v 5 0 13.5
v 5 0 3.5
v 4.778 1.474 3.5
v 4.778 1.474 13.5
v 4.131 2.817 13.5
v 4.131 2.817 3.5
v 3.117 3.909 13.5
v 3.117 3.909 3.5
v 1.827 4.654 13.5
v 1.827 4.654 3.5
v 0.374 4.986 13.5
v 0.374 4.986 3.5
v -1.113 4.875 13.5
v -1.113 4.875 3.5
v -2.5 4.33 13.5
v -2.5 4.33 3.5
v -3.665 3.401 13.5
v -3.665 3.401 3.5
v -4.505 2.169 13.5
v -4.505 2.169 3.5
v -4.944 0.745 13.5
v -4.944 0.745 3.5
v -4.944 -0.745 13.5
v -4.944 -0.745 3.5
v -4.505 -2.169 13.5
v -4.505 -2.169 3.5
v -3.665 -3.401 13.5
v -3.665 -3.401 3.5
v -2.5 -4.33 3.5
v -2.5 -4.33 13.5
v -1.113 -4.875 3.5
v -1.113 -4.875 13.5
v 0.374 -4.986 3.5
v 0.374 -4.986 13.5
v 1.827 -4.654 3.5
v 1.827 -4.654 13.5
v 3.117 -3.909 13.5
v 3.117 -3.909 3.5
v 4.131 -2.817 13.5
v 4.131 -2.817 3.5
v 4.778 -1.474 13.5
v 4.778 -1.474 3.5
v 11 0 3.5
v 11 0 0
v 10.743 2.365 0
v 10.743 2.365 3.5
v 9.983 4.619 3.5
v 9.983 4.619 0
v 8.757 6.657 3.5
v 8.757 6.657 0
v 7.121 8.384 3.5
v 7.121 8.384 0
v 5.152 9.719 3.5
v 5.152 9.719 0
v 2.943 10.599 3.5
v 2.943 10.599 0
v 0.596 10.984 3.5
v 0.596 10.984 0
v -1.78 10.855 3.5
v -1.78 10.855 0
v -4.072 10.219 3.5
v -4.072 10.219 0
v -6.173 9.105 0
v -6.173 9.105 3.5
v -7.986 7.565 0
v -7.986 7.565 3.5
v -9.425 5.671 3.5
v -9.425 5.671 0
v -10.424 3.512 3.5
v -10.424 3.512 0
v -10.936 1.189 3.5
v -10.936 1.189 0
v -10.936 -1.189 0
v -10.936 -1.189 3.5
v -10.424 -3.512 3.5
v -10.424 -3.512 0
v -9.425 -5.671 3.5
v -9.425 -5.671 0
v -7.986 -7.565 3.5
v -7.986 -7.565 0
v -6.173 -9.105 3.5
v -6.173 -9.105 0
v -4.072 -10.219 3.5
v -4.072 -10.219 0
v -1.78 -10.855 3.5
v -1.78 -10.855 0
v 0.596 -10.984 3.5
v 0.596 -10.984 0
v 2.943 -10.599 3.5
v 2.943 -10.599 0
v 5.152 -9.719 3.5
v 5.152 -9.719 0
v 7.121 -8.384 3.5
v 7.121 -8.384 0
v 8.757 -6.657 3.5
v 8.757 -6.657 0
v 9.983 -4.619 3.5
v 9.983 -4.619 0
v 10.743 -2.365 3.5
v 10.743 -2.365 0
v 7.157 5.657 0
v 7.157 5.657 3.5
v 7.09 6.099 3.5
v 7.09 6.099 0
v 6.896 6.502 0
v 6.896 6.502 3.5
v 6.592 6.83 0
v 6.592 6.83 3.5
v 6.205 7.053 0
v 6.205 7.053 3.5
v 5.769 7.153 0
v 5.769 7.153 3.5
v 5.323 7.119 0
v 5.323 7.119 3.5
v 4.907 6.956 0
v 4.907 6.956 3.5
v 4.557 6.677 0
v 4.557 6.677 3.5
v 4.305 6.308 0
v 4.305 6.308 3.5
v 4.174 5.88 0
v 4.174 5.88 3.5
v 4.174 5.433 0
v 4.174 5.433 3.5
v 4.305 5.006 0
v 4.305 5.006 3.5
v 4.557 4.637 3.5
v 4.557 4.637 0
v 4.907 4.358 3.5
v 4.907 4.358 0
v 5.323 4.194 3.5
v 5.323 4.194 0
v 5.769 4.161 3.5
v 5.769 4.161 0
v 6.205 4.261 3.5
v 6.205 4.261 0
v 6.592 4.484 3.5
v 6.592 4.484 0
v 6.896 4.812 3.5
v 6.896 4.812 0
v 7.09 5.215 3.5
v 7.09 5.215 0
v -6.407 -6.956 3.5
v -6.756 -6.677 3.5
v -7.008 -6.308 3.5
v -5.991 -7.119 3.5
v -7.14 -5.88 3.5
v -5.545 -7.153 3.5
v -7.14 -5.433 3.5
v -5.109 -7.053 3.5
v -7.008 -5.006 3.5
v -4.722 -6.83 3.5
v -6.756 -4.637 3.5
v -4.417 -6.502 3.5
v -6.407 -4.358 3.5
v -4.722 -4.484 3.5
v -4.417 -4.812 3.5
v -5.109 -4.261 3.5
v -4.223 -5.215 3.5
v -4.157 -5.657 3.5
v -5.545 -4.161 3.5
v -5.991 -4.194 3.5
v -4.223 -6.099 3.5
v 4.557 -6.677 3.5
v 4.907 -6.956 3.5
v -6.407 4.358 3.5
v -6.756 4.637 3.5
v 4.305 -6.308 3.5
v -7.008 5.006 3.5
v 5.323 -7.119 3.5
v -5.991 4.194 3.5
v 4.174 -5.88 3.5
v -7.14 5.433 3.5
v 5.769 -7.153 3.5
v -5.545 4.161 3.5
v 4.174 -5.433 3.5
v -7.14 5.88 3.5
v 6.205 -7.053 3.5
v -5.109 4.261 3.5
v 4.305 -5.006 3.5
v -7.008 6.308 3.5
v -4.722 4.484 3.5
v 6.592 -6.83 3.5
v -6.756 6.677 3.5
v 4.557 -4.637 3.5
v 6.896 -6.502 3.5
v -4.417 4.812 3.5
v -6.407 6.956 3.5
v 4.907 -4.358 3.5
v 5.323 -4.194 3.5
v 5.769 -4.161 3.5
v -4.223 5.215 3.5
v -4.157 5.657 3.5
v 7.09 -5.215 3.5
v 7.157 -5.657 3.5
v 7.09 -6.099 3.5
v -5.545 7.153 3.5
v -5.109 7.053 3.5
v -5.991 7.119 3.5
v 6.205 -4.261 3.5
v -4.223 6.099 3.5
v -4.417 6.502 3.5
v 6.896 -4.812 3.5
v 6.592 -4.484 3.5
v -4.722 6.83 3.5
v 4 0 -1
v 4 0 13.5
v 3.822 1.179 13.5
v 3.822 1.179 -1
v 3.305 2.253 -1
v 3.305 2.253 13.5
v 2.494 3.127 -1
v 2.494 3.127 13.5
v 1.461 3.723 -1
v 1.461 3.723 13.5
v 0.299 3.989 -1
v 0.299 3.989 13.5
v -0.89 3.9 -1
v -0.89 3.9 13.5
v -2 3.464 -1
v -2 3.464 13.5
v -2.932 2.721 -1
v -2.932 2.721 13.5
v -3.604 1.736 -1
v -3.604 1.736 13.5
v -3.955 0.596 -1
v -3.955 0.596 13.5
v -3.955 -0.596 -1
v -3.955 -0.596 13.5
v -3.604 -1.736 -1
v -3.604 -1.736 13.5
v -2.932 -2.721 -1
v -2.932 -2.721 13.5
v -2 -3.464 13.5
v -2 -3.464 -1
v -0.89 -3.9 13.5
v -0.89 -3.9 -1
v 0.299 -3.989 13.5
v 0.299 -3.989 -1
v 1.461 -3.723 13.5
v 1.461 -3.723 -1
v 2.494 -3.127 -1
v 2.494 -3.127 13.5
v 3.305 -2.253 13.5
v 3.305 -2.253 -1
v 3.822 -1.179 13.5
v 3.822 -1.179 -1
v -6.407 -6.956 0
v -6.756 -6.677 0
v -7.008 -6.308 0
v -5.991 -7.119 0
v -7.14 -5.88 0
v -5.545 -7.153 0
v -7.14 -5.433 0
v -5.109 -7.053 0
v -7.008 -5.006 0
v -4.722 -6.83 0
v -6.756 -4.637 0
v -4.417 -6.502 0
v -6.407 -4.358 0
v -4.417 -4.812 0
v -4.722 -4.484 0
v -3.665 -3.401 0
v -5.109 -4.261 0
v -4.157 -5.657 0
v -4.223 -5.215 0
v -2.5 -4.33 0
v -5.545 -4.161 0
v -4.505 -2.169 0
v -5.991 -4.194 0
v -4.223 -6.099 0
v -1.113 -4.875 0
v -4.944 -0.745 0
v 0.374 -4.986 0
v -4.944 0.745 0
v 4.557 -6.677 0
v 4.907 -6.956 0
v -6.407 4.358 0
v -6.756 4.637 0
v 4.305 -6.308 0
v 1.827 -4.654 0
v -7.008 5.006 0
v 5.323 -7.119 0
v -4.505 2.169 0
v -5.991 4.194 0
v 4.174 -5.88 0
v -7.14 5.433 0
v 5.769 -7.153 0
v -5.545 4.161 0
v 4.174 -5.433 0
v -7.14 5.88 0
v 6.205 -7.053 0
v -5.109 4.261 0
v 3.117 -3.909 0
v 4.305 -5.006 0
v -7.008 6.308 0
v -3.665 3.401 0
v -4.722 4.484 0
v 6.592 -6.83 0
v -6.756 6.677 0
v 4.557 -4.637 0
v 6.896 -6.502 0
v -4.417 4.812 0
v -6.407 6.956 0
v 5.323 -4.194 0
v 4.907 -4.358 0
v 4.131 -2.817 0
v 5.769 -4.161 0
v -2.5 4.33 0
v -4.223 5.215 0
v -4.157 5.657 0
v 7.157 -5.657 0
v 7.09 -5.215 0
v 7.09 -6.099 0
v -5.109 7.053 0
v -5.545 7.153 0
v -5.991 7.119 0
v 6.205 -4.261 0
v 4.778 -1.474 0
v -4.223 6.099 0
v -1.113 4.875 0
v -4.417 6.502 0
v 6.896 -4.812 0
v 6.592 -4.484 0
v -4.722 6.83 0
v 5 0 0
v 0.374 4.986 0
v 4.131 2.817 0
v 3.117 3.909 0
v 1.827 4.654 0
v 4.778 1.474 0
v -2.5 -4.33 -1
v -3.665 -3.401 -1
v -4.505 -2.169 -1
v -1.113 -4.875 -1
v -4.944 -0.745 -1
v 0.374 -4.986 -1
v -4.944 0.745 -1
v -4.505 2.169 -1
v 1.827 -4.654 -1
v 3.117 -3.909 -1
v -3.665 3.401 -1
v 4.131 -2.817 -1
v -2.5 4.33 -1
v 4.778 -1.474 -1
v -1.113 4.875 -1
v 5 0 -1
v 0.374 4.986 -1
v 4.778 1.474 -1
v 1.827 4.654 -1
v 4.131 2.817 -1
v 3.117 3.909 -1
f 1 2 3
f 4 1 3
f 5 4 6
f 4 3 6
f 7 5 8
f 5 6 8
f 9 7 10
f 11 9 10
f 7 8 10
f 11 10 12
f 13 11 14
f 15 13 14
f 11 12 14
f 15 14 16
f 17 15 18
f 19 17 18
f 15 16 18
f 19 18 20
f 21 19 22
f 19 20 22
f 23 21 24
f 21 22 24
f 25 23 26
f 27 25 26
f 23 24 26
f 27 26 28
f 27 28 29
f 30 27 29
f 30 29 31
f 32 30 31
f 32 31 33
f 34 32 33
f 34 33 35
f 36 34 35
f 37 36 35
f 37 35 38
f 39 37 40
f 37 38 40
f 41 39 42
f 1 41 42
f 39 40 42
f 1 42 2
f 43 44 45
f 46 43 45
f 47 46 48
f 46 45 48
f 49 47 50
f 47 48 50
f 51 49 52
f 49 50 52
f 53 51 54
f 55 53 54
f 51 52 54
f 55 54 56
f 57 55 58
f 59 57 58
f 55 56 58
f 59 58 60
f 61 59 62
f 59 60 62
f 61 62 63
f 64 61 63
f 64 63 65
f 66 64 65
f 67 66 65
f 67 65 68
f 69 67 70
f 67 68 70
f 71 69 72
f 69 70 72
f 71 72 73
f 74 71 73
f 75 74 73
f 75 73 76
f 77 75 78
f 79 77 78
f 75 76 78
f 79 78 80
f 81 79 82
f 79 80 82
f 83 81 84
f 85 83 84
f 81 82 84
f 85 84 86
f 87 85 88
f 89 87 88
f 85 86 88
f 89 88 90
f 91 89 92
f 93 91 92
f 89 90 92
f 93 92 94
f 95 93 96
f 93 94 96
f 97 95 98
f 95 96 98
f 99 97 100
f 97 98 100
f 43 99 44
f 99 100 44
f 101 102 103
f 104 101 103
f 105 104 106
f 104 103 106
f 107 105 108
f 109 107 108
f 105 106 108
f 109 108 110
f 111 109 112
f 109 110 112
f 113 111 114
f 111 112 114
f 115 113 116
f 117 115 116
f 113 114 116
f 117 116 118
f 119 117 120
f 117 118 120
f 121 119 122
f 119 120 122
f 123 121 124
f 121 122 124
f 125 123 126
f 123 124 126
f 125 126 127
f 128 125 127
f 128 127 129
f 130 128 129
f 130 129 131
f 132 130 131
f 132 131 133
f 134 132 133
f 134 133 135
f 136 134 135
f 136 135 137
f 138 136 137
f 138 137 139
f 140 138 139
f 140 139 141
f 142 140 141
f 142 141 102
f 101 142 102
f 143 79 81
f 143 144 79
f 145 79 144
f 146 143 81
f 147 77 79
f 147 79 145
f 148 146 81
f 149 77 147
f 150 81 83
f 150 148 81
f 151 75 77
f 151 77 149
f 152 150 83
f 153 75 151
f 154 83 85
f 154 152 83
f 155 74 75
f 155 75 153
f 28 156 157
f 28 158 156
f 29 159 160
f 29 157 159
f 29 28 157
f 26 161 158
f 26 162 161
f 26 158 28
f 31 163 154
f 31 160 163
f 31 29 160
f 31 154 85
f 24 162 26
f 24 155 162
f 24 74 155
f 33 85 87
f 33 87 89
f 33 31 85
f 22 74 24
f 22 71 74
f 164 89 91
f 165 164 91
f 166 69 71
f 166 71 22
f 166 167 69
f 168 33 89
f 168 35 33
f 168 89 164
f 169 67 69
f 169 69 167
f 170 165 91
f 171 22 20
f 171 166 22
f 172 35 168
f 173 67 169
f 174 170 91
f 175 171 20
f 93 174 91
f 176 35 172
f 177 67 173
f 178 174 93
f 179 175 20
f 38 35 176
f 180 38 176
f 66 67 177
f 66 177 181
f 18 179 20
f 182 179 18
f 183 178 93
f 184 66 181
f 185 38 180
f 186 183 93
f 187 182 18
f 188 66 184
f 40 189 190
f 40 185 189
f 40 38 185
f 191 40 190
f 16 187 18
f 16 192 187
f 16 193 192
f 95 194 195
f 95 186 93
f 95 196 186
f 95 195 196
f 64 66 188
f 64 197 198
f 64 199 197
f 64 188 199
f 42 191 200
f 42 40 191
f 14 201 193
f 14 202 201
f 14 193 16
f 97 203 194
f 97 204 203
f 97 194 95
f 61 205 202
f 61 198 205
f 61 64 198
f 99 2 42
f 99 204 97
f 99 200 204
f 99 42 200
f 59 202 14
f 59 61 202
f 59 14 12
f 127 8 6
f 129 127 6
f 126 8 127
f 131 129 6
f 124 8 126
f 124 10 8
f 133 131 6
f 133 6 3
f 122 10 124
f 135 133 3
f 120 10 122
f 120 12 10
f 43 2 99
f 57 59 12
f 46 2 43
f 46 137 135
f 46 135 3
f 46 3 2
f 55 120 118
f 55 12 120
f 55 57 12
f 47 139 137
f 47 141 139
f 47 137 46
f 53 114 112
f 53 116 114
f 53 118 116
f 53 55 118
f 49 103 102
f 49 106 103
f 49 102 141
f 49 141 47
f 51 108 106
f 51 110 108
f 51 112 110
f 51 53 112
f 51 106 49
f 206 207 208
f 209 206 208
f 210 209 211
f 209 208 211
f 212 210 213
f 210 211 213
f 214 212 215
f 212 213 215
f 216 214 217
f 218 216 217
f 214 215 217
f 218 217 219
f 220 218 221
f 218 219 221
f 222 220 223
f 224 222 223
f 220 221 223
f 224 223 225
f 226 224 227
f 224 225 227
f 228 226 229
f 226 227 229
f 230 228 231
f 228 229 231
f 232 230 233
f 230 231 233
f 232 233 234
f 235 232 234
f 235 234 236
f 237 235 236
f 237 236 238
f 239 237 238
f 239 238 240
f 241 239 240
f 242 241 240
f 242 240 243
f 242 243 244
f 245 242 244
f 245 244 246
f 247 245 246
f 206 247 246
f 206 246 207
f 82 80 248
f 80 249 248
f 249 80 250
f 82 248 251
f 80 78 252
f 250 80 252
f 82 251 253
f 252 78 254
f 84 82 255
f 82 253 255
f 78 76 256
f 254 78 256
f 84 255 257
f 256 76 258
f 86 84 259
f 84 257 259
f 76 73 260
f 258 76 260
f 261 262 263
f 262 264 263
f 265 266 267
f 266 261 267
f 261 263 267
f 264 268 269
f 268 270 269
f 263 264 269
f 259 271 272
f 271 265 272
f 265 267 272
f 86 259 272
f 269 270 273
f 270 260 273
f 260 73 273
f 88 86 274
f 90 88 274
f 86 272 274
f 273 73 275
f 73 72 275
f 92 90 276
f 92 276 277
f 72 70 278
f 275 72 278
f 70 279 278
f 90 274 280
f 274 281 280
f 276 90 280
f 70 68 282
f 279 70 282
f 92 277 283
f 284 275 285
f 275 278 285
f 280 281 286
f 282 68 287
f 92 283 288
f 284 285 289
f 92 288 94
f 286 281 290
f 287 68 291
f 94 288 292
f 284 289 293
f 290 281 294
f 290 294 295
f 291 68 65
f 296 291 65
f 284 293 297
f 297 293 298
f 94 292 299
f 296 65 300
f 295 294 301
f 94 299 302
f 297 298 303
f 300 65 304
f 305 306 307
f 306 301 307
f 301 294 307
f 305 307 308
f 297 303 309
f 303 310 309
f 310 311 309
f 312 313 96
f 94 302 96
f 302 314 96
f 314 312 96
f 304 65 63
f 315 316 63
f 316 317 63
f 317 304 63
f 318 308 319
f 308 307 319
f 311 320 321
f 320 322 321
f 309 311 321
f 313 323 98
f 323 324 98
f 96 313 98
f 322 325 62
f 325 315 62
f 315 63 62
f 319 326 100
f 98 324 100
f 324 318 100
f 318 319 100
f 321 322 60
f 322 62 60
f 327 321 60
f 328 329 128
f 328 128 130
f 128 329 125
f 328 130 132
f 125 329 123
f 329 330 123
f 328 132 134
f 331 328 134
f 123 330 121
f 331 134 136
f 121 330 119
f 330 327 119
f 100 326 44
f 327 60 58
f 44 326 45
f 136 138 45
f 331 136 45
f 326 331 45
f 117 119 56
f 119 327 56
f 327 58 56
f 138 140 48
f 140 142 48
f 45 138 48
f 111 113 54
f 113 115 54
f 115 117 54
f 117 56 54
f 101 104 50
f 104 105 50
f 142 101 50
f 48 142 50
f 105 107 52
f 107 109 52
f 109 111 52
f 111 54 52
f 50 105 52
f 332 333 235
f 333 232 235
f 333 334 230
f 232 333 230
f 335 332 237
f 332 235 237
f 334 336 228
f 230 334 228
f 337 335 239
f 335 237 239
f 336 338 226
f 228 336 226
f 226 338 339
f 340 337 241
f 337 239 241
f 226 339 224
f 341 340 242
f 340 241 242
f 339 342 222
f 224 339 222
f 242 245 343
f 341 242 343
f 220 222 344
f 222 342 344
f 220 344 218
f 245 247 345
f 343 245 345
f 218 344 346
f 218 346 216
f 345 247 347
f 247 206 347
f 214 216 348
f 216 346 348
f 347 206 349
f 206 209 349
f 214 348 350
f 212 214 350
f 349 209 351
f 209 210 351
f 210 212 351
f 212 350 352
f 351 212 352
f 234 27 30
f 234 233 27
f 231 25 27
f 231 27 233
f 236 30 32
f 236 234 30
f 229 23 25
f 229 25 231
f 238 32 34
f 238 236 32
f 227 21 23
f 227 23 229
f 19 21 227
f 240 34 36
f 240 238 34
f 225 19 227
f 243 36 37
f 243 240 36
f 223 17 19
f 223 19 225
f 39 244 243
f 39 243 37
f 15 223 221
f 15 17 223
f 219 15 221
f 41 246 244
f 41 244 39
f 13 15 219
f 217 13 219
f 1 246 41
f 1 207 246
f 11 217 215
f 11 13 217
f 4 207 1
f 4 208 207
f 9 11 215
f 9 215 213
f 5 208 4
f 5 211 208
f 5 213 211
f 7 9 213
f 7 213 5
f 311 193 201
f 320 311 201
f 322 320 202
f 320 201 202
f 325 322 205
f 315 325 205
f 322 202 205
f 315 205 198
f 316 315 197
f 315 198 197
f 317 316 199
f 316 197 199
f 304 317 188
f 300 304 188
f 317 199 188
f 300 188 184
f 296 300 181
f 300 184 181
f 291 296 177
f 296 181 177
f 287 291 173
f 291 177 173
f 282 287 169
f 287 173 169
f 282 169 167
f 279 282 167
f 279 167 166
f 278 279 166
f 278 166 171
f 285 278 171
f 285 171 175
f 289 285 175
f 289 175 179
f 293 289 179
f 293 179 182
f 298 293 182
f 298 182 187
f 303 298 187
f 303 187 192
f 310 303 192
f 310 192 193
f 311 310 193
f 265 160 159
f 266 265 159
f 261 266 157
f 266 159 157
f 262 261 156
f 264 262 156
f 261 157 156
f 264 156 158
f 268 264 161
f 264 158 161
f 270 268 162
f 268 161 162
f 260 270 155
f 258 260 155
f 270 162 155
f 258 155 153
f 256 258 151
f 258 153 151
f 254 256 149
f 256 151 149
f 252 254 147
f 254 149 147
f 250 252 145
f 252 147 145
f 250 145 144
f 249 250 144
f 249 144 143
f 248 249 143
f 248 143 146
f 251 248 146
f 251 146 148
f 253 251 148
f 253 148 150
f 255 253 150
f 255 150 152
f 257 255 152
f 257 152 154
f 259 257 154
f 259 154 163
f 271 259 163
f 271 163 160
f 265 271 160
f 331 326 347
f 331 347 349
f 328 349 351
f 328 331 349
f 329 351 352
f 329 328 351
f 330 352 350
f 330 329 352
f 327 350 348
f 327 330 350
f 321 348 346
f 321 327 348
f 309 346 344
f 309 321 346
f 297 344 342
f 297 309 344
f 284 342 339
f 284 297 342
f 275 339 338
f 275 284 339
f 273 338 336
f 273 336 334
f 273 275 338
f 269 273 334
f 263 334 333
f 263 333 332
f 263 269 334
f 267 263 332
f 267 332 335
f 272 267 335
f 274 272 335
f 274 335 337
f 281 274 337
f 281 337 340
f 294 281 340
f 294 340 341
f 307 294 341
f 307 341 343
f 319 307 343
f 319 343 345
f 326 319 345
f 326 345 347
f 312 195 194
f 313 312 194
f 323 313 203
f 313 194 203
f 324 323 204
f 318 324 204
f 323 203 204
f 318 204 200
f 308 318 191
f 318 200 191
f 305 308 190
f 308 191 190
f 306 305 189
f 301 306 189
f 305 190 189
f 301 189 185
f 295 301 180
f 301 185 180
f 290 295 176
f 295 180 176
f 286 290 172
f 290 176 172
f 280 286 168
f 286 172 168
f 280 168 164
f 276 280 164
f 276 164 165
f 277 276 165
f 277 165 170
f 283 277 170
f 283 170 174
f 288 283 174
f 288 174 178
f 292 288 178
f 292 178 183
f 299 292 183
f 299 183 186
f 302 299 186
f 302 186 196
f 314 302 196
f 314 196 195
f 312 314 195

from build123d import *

# Parameters (mm, degrees)
SKETCH_R          = 11
PAD_DEPTH         = 3.5
SKETCH001_R       = 5
PAD001_DEPTH      = 10
PAD001_DEPTH_BACK = 4.5
SKETCH002_R       = 4
POCKET_DEPTH      = 14.501
SKETCH003_R       = 1.5
POCKET001_DEPTH   = 4.501


with BuildPart() as part:
    # Sketch → Pad (new body)
    with BuildSketch(Plane.XY):
        Circle(SKETCH_R)
    extrude(amount=PAD_DEPTH)

    # Sketch001 (on Face3 of Pad) → Pad001 (join, two sides)
    with BuildSketch(Plane.XY.offset(3.5)) as pad001_sk:
        Circle(SKETCH001_R)
    extrude(amount=PAD001_DEPTH)
    extrude(pad001_sk.sketch, amount=-PAD001_DEPTH_BACK)

    # Sketch002 (on Face7 of Pad001) → Pocket (cut, through all)
    with BuildSketch(Plane.XY.offset(13.5)):
        Circle(SKETCH002_R)
    extrude(amount=-POCKET_DEPTH, mode=Mode.SUBTRACT)

    # Sketch003 (on Face3 of Pocket) → Pocket001 (cut, through all)
    with BuildSketch(Plane.XY.offset(3.5)):
        with Locations((-5.656854, 5.656854)):
            Circle(SKETCH003_R)
        with Locations((5.656854, 5.656854)):
            Circle(SKETCH003_R)
        with Locations((5.656854, -5.656854)):
            Circle(SKETCH003_R)
        with Locations((-5.656854, -5.656854)):
            Circle(SKETCH003_R)
    extrude(amount=-POCKET001_DEPTH, mode=Mode.SUBTRACT)


solid = part.part
